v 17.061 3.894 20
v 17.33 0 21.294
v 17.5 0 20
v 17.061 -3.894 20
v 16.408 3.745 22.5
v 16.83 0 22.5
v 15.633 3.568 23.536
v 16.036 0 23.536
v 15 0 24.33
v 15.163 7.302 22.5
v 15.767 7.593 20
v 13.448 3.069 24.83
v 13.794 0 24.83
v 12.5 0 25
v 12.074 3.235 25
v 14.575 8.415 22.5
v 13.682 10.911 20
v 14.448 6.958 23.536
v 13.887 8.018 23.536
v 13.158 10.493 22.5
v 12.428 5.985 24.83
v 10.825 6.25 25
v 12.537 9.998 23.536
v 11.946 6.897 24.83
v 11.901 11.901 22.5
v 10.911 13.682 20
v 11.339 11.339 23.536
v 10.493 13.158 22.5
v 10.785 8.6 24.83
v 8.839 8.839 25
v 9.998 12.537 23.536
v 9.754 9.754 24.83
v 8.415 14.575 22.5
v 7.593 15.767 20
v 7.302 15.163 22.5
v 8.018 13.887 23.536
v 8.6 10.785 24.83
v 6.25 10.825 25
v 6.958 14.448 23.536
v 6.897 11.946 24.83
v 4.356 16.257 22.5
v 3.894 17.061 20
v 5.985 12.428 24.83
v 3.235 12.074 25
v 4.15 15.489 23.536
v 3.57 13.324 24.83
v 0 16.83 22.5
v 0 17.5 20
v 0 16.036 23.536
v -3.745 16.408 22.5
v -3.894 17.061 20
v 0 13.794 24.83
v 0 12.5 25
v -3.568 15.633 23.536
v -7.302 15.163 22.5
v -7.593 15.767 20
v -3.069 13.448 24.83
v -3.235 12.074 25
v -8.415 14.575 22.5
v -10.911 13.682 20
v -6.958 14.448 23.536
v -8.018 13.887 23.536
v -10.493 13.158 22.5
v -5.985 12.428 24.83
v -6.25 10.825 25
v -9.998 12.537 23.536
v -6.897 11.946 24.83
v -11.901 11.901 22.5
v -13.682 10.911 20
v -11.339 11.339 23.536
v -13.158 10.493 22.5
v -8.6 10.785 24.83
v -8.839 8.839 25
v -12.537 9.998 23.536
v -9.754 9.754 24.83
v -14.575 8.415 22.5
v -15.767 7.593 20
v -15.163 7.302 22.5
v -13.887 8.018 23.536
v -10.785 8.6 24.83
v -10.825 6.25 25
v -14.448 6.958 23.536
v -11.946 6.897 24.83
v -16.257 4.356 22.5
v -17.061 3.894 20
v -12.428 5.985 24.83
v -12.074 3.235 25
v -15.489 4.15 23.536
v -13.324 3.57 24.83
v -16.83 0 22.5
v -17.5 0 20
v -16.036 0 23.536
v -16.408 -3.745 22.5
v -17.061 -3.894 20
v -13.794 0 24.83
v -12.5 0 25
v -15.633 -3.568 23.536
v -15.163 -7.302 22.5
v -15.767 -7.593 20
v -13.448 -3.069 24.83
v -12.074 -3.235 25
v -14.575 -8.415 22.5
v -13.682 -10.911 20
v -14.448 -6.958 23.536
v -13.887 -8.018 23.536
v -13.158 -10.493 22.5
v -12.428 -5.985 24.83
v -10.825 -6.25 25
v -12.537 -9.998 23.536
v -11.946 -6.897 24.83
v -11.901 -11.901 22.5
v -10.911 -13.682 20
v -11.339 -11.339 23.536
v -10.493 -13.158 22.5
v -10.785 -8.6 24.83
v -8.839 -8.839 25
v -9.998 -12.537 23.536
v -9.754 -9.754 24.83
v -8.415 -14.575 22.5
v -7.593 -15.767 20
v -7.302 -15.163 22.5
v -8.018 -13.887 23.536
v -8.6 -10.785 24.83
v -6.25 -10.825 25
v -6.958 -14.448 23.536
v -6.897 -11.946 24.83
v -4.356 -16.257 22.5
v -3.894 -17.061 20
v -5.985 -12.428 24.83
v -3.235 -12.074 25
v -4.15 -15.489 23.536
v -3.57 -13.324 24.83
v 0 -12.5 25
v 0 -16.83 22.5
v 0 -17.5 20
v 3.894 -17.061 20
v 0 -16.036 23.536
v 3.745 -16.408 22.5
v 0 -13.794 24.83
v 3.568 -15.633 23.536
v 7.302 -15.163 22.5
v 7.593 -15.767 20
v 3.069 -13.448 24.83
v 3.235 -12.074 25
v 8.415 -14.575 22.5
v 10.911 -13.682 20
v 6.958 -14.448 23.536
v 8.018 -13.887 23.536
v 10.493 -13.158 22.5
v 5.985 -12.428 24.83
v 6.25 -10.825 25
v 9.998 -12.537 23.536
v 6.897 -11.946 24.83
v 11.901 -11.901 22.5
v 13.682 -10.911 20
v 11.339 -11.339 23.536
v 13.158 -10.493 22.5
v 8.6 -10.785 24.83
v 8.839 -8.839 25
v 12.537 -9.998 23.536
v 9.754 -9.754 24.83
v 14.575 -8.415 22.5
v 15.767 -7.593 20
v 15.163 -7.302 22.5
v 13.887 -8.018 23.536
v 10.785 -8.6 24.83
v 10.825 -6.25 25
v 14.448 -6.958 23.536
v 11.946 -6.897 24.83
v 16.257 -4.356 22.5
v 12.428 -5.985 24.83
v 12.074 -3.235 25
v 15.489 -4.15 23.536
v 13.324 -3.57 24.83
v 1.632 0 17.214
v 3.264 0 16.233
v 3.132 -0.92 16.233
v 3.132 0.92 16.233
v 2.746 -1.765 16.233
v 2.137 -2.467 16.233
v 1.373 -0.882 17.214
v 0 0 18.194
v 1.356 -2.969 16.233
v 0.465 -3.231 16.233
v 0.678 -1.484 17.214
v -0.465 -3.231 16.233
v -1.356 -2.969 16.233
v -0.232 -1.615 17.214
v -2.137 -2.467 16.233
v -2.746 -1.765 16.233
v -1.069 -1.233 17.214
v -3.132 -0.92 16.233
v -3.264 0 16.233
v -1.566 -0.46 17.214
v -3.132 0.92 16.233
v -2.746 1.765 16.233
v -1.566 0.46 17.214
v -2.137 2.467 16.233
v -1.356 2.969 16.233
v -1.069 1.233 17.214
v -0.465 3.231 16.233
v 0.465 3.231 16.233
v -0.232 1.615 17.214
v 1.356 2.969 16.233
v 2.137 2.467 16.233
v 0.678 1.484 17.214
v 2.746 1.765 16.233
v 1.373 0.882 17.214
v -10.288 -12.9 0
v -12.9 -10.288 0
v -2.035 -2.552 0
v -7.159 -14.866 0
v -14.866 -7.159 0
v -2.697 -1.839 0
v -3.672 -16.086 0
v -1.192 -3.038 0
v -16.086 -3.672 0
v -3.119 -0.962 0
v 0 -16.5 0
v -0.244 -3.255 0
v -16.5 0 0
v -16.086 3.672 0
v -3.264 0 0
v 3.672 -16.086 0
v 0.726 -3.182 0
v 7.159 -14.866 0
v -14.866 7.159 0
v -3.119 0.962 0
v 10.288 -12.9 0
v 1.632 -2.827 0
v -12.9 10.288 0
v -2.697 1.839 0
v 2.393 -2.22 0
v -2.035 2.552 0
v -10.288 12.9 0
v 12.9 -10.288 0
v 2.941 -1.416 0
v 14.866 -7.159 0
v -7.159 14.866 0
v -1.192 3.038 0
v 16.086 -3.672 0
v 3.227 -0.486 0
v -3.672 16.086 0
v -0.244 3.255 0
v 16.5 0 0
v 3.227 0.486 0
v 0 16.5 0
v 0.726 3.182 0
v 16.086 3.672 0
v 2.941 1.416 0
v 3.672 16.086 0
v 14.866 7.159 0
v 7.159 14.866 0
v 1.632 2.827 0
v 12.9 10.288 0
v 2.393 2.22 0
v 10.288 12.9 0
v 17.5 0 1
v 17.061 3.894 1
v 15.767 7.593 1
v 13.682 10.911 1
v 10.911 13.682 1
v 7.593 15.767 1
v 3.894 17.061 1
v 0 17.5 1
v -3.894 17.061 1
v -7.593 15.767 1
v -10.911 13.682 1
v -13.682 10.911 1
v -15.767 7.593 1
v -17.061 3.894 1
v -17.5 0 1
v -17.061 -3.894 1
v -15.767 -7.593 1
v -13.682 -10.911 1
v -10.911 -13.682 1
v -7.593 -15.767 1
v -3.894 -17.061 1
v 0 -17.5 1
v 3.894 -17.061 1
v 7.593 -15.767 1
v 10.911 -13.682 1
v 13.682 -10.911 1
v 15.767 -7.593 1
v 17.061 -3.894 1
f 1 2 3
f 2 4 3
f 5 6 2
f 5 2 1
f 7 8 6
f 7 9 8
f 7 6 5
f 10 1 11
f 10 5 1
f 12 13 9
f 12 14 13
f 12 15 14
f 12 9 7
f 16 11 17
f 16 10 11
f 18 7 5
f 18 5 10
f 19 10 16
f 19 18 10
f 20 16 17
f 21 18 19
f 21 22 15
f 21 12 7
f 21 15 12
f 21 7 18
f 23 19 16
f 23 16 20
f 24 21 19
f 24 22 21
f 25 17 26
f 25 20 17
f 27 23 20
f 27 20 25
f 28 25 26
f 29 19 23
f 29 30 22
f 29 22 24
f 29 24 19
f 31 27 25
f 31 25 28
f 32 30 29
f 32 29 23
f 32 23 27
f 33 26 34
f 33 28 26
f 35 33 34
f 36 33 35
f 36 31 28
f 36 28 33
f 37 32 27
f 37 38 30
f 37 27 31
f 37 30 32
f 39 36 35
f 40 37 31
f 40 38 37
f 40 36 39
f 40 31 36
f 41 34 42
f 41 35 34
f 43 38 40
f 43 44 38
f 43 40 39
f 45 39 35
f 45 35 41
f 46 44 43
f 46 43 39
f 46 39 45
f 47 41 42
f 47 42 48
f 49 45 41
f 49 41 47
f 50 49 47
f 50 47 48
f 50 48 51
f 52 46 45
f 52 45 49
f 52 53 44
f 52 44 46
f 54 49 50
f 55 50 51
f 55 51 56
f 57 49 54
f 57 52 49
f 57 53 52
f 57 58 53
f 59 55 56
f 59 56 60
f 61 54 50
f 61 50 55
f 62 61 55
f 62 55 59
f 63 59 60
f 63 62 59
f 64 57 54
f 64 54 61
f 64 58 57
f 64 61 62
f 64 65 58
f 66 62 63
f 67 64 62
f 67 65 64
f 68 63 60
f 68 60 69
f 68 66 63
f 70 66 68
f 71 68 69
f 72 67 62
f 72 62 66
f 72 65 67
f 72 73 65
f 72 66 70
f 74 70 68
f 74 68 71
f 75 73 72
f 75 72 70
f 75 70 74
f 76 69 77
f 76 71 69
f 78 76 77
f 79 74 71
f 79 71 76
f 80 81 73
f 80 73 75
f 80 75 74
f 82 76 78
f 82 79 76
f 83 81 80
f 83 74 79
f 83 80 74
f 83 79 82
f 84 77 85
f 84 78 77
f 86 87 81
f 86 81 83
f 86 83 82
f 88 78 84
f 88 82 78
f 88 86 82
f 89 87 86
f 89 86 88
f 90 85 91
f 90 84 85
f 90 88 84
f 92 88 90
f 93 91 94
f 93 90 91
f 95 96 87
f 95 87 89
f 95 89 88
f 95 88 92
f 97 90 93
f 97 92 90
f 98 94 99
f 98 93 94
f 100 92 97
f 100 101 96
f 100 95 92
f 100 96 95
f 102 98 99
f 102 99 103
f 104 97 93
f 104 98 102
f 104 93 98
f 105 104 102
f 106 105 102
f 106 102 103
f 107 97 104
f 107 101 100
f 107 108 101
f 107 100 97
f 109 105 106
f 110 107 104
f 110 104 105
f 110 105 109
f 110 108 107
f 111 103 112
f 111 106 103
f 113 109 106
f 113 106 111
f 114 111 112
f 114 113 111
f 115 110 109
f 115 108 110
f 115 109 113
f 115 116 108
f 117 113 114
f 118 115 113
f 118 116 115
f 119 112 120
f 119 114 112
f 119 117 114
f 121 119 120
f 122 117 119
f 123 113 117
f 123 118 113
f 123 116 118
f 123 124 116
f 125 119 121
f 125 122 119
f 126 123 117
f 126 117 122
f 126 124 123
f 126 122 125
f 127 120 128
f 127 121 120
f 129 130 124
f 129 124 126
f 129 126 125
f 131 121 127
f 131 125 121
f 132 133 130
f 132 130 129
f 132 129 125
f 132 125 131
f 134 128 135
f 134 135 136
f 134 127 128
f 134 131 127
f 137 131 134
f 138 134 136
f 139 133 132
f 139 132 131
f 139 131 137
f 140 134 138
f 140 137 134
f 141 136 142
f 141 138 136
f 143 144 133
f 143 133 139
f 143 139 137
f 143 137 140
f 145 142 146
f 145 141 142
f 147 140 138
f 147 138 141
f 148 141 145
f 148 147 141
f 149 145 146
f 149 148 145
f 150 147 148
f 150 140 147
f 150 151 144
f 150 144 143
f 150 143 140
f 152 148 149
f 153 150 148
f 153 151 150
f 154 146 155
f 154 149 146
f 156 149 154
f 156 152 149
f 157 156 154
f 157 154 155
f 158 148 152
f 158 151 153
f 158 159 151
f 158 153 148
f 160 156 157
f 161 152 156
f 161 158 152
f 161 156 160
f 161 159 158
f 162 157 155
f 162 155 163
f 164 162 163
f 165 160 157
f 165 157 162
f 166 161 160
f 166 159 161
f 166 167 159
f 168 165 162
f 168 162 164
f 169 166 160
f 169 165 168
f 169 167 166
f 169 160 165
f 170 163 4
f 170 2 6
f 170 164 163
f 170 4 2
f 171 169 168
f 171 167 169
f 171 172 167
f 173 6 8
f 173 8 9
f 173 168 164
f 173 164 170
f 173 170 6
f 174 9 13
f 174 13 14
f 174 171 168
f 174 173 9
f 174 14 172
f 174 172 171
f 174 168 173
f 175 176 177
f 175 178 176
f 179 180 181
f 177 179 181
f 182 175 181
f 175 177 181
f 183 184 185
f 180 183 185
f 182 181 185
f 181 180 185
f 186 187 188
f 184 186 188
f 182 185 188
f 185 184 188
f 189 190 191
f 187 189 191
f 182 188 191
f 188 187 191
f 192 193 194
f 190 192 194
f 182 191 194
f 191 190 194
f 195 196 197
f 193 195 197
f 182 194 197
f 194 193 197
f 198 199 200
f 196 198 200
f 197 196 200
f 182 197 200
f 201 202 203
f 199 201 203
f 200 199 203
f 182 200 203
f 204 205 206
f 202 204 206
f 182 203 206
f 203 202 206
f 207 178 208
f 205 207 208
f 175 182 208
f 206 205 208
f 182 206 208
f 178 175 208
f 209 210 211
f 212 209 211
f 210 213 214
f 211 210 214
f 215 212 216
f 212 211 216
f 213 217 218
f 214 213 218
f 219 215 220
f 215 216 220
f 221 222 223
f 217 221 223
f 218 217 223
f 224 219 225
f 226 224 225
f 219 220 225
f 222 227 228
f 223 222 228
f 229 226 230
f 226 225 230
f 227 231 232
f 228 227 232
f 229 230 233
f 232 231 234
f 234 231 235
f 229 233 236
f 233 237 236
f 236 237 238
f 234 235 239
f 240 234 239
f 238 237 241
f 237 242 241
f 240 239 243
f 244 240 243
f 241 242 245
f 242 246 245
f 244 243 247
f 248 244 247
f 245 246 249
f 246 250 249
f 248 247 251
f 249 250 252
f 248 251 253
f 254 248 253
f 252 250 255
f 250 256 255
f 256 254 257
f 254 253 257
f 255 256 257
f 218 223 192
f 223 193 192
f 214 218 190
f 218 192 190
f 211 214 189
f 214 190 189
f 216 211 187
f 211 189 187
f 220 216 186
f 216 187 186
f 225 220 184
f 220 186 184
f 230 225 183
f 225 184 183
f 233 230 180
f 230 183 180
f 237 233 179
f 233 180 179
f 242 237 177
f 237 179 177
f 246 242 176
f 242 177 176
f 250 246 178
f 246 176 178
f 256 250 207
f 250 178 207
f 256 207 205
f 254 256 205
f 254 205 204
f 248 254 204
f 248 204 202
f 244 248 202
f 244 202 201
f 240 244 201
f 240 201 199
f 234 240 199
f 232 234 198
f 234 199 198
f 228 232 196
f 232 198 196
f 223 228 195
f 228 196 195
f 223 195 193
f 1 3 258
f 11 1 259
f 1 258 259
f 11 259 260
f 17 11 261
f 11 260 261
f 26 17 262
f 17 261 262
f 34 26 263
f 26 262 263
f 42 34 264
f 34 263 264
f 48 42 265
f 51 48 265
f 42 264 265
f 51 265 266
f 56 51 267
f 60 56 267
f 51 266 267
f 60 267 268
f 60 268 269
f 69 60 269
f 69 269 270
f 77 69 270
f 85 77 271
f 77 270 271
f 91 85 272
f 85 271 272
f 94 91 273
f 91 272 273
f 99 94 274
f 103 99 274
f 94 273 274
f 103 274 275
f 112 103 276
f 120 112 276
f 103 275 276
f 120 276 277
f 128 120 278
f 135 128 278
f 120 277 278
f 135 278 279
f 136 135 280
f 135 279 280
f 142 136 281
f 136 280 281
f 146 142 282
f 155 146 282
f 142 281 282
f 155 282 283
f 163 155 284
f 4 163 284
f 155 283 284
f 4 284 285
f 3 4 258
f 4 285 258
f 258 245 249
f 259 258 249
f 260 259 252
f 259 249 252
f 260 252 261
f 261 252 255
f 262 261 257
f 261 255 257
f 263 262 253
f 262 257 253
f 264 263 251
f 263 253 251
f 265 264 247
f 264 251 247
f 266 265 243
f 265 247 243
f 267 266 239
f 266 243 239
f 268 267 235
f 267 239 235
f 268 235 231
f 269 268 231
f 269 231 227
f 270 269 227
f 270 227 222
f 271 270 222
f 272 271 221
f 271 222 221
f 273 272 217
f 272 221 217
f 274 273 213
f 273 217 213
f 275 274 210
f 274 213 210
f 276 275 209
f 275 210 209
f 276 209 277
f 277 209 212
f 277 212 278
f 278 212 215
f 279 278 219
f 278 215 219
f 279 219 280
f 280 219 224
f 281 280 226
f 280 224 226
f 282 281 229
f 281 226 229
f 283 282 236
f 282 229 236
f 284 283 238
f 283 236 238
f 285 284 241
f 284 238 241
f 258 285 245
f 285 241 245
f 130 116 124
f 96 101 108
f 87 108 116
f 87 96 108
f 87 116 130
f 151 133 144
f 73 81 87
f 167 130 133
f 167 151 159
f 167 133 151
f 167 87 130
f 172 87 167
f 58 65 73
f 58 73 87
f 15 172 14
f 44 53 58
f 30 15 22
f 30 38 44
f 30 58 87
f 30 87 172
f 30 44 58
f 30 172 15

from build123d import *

# Parameters (mm, degrees)
F0_R     = 17.5
F1_DEPTH = 25
F2_R     = 5
F3_SIZE  = 1
F4_D     = 6.5278
F4_DEPTH = 16.2333333333
F4_TIP   = 1.9611489744


with BuildPart() as f1:
    # F0 (on Top) → F1 (new body)
    with BuildSketch(Plane.XY):
        Circle(F0_R)
    extrude(amount=F1_DEPTH)

    # F2
    f2_edges = [f1.edges().sort_by_distance(p)[0] for p in [
        (-17.5, 0, 25),
    ]]
    fillet(f2_edges, radius=F2_R)

    # F3
    f3_edges = [f1.edges().sort_by_distance(p)[0] for p in [
        (-17.5, 0, 0),
    ]]
    chamfer(f3_edges, length=F3_SIZE)

    # F4
    with Locations(Plane(origin=(0, 0, 0), x_dir=(1, 0, 0), z_dir=(0, 0, -1))):
        with Locations((0, 0)):
            Hole(F4_D / 2, depth=F4_DEPTH)
            with Locations((0, 0, -(F4_DEPTH + F4_TIP / 2))):  # 118° drill point
                Cone(0, F4_D / 2, F4_TIP, mode=Mode.SUBTRACT)


solid = f1.part
